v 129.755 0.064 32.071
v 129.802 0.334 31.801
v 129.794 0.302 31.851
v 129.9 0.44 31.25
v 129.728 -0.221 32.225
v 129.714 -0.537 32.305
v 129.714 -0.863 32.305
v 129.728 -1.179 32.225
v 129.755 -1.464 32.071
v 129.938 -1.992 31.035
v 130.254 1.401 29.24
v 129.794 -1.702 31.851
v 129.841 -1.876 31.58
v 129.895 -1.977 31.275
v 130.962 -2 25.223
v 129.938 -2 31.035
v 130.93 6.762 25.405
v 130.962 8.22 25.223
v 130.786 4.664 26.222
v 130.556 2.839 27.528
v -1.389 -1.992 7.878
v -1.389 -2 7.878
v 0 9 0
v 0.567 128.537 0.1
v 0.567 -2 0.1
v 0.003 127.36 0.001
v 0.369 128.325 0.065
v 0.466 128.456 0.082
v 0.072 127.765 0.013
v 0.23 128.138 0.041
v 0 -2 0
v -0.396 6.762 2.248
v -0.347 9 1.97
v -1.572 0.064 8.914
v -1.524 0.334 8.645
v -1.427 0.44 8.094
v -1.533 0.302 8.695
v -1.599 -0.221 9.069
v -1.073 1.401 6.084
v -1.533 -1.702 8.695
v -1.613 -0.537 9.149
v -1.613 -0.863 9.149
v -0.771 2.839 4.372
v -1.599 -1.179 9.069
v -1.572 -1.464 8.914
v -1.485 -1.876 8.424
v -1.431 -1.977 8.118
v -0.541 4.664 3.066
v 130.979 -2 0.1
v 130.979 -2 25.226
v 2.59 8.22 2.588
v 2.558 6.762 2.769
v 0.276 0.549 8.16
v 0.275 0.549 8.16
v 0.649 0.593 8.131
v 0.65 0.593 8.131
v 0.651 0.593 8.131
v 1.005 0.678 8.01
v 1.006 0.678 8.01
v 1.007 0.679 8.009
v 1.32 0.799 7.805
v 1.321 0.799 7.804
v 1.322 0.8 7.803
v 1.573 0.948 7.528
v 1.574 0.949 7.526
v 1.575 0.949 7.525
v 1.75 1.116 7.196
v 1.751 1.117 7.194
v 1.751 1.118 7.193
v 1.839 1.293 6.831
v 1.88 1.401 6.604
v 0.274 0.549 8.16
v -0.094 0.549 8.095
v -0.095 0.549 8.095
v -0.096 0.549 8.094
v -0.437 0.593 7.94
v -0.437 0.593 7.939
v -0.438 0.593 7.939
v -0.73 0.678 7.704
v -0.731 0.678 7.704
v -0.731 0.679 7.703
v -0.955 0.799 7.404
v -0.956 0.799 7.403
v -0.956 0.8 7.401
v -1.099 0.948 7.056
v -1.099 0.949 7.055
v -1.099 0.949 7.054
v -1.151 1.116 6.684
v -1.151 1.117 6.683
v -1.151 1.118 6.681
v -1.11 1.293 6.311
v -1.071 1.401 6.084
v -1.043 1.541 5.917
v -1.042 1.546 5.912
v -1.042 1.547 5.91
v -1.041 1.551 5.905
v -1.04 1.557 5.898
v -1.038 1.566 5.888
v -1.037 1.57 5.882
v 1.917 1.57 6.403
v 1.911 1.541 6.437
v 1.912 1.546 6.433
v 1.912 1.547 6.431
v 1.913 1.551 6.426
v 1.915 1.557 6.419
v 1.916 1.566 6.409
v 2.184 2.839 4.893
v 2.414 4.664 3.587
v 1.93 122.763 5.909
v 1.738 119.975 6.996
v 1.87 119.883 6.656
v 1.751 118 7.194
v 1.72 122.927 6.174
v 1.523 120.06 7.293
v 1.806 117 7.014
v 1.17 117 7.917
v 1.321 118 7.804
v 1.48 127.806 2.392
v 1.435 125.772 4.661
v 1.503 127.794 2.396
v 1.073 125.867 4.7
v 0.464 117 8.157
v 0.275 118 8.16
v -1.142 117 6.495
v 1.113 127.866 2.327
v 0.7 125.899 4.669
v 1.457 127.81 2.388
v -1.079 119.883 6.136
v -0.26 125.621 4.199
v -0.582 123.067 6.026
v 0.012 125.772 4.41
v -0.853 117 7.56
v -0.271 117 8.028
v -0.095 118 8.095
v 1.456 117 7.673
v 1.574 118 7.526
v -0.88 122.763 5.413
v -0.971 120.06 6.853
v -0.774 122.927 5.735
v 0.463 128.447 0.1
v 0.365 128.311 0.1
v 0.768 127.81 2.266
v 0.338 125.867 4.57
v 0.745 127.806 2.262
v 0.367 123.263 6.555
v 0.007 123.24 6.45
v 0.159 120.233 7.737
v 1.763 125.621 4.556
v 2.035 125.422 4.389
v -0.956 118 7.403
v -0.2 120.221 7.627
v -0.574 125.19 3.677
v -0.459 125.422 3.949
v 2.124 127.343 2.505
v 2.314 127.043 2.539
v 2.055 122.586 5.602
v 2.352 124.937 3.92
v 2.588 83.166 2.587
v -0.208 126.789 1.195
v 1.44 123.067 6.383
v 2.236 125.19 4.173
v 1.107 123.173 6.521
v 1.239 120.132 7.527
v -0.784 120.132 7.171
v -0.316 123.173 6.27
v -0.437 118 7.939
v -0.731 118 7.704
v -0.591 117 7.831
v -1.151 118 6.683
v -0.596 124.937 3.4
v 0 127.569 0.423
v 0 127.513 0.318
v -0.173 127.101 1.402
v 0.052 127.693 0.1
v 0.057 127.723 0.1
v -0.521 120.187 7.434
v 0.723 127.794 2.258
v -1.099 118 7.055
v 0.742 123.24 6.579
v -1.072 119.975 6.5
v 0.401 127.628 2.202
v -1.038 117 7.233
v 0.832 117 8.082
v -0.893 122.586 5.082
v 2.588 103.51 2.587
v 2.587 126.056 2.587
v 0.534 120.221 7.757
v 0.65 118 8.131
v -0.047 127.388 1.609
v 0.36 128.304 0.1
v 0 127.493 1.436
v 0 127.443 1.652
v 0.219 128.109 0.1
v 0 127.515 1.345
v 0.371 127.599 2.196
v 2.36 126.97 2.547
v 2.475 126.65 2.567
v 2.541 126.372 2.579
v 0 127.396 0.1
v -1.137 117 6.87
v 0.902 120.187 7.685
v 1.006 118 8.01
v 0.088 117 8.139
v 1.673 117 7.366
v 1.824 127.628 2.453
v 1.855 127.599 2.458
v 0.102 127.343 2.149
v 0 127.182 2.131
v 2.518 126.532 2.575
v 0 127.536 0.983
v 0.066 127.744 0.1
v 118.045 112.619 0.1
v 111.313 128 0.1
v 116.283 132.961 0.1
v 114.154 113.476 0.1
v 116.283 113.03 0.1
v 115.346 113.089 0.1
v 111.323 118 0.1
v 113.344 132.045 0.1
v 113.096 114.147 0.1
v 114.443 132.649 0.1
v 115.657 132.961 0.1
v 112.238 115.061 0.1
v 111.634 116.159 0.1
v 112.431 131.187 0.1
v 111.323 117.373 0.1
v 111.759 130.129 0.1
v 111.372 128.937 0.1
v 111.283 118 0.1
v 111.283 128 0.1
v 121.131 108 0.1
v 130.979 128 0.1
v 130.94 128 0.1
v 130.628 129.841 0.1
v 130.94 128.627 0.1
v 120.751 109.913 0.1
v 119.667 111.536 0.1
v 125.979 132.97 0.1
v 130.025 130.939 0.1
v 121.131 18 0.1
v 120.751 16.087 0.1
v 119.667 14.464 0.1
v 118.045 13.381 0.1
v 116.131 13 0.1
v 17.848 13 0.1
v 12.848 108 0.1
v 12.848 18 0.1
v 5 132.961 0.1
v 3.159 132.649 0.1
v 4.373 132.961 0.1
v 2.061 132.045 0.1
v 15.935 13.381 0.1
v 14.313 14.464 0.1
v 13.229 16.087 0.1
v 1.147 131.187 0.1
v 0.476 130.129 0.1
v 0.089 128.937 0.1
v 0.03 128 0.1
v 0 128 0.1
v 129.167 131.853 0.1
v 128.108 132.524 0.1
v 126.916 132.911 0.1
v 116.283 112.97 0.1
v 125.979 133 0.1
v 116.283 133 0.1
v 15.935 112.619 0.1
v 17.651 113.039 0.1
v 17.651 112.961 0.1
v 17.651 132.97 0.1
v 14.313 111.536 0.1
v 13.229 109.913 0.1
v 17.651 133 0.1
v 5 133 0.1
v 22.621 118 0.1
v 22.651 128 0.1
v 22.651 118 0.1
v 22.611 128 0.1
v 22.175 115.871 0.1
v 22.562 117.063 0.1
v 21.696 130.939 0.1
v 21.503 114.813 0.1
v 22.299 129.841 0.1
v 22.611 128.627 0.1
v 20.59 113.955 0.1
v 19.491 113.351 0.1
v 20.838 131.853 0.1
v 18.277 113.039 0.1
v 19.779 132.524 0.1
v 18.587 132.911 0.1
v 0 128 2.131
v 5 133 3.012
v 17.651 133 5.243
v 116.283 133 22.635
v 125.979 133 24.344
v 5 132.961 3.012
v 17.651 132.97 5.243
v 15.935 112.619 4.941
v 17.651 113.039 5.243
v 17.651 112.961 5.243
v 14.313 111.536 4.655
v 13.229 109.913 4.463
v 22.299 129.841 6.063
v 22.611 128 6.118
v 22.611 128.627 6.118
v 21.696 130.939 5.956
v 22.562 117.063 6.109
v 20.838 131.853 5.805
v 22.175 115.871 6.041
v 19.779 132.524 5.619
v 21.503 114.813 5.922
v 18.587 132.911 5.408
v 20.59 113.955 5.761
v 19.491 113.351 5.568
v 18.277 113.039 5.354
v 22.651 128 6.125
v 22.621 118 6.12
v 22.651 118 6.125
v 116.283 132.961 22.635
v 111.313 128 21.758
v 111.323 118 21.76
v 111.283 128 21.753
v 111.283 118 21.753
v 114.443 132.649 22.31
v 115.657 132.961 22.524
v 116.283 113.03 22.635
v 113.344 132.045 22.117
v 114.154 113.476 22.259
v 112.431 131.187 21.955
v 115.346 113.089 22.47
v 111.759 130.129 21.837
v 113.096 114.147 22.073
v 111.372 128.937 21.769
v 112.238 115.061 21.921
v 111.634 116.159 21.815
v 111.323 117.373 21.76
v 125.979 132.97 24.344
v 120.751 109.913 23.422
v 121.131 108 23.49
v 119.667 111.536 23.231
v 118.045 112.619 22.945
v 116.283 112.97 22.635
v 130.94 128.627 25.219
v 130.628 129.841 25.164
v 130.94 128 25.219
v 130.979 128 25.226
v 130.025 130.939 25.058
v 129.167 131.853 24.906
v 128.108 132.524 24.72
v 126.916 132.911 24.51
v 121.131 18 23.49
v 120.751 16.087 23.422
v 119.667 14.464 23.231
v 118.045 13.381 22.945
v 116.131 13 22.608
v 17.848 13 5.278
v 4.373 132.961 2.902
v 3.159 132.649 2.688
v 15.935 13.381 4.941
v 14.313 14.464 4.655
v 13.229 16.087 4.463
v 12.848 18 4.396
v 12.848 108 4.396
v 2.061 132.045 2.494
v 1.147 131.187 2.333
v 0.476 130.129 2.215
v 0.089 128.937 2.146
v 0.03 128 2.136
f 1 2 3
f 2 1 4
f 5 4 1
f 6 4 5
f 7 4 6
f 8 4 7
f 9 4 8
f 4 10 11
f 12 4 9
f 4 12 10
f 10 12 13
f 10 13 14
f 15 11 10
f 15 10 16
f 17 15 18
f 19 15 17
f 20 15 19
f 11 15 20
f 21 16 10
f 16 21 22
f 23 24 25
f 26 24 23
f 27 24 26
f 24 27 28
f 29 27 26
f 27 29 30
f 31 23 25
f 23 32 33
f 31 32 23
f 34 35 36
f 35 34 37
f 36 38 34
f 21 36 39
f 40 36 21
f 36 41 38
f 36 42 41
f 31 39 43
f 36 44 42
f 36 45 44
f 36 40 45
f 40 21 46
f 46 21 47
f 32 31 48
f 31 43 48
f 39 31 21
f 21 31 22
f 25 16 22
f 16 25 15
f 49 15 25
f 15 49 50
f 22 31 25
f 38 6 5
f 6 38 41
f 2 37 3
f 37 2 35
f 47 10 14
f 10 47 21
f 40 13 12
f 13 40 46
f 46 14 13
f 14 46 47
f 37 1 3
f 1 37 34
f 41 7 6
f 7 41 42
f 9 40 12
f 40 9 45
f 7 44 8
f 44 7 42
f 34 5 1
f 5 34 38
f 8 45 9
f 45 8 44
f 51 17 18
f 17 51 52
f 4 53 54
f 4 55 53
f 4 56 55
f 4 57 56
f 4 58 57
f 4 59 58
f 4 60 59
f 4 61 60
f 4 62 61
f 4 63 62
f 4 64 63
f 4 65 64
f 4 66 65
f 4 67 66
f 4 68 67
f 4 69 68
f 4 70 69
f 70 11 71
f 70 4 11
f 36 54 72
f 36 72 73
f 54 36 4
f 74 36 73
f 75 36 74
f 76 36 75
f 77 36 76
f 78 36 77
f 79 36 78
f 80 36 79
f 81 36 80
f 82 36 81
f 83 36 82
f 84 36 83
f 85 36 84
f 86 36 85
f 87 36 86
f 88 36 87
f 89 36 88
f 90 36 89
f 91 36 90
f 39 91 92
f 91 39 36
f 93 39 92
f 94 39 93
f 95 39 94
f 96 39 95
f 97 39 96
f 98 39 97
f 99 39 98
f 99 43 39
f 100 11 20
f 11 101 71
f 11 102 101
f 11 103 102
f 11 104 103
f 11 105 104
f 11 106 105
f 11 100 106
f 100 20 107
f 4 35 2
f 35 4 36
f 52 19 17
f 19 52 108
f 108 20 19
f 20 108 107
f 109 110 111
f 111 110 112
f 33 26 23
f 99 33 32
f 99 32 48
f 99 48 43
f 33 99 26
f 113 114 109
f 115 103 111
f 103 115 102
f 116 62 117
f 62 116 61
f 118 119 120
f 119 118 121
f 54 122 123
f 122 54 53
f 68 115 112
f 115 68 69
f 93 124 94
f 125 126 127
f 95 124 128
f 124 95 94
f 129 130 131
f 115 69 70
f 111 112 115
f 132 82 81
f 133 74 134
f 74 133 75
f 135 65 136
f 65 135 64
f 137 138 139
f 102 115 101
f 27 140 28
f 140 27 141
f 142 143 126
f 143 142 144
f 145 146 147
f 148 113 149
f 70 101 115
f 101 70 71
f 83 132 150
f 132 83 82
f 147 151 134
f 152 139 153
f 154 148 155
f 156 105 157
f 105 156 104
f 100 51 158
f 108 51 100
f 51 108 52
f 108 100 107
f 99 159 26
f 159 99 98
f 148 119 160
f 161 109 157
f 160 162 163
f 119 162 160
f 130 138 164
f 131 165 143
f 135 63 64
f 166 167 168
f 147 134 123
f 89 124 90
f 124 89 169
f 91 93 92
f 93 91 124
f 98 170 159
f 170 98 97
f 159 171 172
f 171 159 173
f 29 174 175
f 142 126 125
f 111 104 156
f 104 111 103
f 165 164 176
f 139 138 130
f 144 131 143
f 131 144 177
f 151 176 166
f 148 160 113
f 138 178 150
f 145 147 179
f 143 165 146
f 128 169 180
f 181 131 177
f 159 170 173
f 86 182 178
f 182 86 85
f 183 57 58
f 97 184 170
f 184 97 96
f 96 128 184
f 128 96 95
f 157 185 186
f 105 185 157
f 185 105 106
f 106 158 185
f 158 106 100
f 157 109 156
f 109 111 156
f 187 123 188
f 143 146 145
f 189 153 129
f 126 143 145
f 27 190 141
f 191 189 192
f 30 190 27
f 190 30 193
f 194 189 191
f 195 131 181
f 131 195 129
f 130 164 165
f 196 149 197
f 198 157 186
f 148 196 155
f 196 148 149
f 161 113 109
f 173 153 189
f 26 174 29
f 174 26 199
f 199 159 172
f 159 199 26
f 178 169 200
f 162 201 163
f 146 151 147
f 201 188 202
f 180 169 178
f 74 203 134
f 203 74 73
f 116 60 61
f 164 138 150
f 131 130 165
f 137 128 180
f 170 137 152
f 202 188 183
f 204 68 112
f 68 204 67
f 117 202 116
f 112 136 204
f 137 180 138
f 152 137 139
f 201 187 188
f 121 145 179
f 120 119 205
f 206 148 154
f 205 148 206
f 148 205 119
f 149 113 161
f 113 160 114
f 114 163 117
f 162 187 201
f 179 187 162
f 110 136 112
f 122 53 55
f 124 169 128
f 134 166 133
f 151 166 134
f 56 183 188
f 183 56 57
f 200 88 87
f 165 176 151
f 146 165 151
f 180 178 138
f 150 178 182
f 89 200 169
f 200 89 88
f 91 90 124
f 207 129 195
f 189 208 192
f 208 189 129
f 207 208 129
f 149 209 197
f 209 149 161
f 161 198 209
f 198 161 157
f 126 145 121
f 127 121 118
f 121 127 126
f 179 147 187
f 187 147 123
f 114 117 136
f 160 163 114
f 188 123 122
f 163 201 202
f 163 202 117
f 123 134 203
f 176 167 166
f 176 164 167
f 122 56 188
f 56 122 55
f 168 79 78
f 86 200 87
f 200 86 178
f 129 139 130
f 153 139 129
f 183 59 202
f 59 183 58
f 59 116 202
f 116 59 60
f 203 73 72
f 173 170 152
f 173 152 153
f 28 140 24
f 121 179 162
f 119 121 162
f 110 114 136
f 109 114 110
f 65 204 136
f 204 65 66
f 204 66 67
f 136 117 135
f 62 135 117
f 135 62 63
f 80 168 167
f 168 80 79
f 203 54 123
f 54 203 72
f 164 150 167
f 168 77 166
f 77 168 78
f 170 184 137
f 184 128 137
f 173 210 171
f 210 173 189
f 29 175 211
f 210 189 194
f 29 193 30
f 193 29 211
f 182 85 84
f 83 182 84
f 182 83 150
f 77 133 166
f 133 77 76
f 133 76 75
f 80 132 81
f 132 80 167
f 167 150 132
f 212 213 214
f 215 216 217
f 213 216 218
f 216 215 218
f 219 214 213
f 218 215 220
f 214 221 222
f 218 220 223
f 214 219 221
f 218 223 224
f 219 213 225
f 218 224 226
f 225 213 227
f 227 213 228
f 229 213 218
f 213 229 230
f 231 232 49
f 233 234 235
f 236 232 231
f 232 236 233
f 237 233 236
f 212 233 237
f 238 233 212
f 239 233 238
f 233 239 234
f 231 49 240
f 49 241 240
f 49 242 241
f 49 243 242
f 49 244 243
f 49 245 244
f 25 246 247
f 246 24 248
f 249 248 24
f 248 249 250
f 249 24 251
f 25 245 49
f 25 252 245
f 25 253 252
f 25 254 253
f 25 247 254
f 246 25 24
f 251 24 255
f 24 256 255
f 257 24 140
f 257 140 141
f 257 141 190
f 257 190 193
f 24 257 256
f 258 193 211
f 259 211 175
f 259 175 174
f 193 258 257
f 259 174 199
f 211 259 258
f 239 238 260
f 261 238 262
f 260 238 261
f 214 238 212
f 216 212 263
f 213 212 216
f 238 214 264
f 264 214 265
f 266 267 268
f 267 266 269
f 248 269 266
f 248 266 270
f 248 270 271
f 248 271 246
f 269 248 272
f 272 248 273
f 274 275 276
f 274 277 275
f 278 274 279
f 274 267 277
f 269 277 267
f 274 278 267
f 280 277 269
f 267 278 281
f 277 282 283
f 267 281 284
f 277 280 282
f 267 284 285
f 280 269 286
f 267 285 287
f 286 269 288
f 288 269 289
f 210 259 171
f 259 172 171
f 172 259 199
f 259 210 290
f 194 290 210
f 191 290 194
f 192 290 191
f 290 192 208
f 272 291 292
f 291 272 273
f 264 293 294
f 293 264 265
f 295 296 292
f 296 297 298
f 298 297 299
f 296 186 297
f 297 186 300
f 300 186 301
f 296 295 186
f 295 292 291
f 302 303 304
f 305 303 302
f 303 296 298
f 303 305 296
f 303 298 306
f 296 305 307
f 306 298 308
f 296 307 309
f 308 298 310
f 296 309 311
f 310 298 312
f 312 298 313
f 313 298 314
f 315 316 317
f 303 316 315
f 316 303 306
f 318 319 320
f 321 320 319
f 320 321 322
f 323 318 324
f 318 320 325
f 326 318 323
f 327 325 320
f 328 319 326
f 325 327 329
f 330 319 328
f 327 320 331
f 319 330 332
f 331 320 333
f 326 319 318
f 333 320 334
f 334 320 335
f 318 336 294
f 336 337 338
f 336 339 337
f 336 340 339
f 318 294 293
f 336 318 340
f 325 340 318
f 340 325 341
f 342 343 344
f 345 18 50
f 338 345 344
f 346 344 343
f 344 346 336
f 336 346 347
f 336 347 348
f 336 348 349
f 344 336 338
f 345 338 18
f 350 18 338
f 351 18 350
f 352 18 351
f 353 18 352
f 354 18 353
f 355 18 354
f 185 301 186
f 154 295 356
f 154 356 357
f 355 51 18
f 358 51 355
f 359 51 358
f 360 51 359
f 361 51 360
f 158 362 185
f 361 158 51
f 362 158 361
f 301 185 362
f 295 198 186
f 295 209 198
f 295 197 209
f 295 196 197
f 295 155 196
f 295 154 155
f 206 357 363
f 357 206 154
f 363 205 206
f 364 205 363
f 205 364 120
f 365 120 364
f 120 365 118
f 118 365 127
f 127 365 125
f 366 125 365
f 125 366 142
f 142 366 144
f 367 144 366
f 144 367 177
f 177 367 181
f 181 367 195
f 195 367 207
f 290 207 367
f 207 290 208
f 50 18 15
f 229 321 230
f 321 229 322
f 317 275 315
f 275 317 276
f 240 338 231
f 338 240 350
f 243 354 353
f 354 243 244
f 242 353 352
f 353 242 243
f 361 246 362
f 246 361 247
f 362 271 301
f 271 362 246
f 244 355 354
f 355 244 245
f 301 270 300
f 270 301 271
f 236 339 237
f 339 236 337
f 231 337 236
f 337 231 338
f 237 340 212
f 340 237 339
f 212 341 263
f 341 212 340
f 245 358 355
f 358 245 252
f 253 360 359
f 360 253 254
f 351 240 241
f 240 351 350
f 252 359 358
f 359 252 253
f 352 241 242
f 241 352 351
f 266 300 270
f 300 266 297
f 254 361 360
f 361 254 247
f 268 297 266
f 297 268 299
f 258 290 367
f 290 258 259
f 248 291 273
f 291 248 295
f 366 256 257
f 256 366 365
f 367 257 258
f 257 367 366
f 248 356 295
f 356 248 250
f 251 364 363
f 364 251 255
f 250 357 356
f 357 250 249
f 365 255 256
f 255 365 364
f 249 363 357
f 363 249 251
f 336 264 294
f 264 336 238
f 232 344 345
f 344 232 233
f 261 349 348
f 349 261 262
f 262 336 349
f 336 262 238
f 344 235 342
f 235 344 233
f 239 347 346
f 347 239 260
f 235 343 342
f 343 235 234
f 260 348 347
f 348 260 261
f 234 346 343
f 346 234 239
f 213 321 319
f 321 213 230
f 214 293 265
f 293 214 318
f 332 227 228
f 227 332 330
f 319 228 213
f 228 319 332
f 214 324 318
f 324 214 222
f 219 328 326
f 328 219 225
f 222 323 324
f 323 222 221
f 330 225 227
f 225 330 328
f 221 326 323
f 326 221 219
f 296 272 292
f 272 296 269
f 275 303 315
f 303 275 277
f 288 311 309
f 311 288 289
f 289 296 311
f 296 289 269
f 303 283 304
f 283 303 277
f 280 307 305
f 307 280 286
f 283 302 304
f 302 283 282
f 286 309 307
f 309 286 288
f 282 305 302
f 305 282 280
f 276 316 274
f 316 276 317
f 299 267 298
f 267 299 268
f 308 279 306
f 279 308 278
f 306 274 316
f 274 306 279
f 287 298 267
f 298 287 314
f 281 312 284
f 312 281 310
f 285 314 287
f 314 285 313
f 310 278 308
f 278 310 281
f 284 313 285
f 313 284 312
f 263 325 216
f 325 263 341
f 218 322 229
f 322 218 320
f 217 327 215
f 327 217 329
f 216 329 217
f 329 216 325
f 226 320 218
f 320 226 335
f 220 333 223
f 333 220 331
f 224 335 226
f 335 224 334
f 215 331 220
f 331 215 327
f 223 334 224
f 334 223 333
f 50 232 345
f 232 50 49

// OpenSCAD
/**
 * Parametric module to create an angled ergonomic support for the Apple Magic Trackpad.
 *
 * This OpenSCAD library is part of the [dotscad](https://github.com/dotscad/dotscad)
 * project, an open collection of modules and Things for 3d printing.  Please check there
 * for the latest versions of this and other related files.
 *
 * @copyright  Chris Petersen, 2014
 * @license    http://creativecommons.org/licenses/LGPL/2.1/
 * @license    http://creativecommons.org/licenses/by-sa/3.0/
 *
 * @see        http://www.thingiverse.com/thing:263636
 * @source     https://github.com/dotscad/things/blob/master/magic_trackpad_ergonomic_support/magic_trackpad_ergonomic_support.scad
 */

/* ******************************************************************************
 * Thingiverse Customizer parameters and rendering.
 * ****************************************************************************** */

/* [Global] */

// Target angle of elevation
angle = 10; // [5:45]

// Which hand you use for the trackpad
handed = "right"; // [right,left]

// Add wrist rest to model
wrist_rest = "no"; // [yes,no]

// Length of the wrist rest (cm)
wrist_rest_length = 8; // [0:12]

/* [Hidden] */

// A global overlap variable (to prevent printing glitches)
o = .1;

// Render the part
trackpad_platform(angle, handed);

/* ******************************************************************************
 * Main module code below:
 * ****************************************************************************** */

module round_corner($fn=25) {
    difference() {
        translate([-5,-5,0]) cube([10,10,200]);
        translate([5,5,-1]) cylinder(r=5, h=202);
    }
}

module lower_wall(d, $fn=25) {
    hull() {
        cube([3,1,6]);
        translate([1.5,0,6.5]) rotate([0,90,90]) cylinder(r=1.5,h=d-15);
        intersection() {
            cube([3,d,8]);
            translate([1.5,d-16,-5]) rotate([0,90,0])
                rotate_extrude(convexity = 10, $fn=25)
                translate([11.5, 0, 0])
                circle(r = 1.5);
        }
    }
}

module back_wall(d, angle, $fn=25) {
    difference() {
        union() {
            cube([d+(tan(angle)*2),11,8]);
            translate([0,1.3,8]) rotate([0,90,0]) cylinder(r=1.3,h=d+(tan(angle)*2));
        }
        translate([-o,11,9+2]) rotate([0,90,0]) cylinder(r=9,h=200);
    }
}

module trackpad_platform(angle, handed) {
    d = (13 * 10) + 3; // 13cm on a side, plus a little fudge for the wall
    wp = (wrist_rest == "yes") ? (wrist_rest_length * 10) + 3 : 0; // Convert cm to mm, add a litle fudge, 0 if no wrist rest
    difference() {
        union() {
            // Platform walls
            rotate([0,-angle,0]) union() {
                if (handed == "right") {
                    translate([0,-2,0]) back_wall(d, angle);
                    lower_wall(d);
                }
                else {
                    translate([d+(tan(angle)*2),d+2,0]) rotate([0,0,180]) back_wall(d, angle);
                    translate([3,d,0]) rotate([0,0,180]) lower_wall(d);
                }
            }

            difference() {
                // Base
                difference() {
                    translate([0,(handed == "right" ? -2 : -wp),o]) difference() {
                        cube([d,d+2+wp,d]);
                        rotate([0,-angle,0]) translate([-o,-o,2]) cube([d*2,d*2,d*2]);
                    }

                    if (wrist_rest == "no") {
                      // Front cutout
                      translate([cos(angle)*23,(handed == "right" ? d-30 : -5),-o])
                            cube([cos(angle)*(d-23)-cos(angle)*20, 40, 200]);
                    }

                    translate([0,(handed == "right" ? 8+10 : -10+35),-o]) hull() {
                        for(t = [ [3+5+cos(angle)*10,0,0],
                                  [3+5+cos(angle)*10,d-43,0],
                                  [cos(angle)*(d-10)-5,d-43,0],
                                  [cos(angle)*(d-10)-5,0,0]
                                ]) {
                            translate(t) cylinder(r=5,h=d);
                        }
                    }
                }

                // Rounded edges
                if (wrist_rest == "yes") {
                    // If adding wrist rest, we only want to round the bottom left and right corners
                    if (handed == "right") {
                        for (tr=[ [ [0,d+wp,-o],            [0,0,-90] ],
                                  [ [cos(angle)*d,d+wp,-o], [0,0,180] ],
                                ] ) {
                            translate(tr[0]) rotate(tr[1]) round_corner();
                        }
                    } else {
                        for (tr=[ [ [0,-wp,-o],            [0,0,0]  ],
                                  [ [cos(angle)*d,-wp,-o], [0,0,90] ], 
                                ] ) {
                            translate(tr[0]) rotate(tr[1]) round_corner();
                        }
                    }
                } else {
                    // Without the wrist rest, we want to round all corners of each side
                    if (handed == "right") {
                        for (tr=[ [ [0,d,-o],                    [0,0,-90] ],
                                  [ [cos(angle)*d,d,-o],         [0,0,180] ],
                                  [ [cos(angle)*(d-20),d,-o],    [0,0,-90] ],
                                  [ [cos(angle)*(20+3),d,-o],    [0,0,180] ],
                                  [ [cos(angle)*(20+3),d-20,-o], [0,0,90]  ],
                                  [ [cos(angle)*(d-20),d-20,-o], [0,0,0]   ],
                                ] ) {
                            translate(tr[0]) rotate(tr[1]) round_corner();
                        }
                    } else {
                        for (tr=[ [ [0,0,-o],                           [0,0,0]   ],
                                  [ [cos(angle)*d,0,-o],                [0,0,90]  ],
                                  [ [cos(angle)*d-cos(angle)*20,0,-o],  [0,0,0]   ],
                                  [ [cos(angle)*(20+3),0,-o],           [0,0,90]  ],
                                  [ [cos(angle)*(20+3),20,-o],          [0,0,180] ],
                                  [ [cos(angle)*d-cos(angle)*20,20,-o], [0,0,-90] ],
                                ] ) {
                            translate(tr[0]) rotate(tr[1]) round_corner();
                        }
                    }
                }
            }
        }
        // Max-width cutoff
        translate([cos(angle)*d,-d,-d/2]) cube([d*2,d*3,d*2]);
    }
}
